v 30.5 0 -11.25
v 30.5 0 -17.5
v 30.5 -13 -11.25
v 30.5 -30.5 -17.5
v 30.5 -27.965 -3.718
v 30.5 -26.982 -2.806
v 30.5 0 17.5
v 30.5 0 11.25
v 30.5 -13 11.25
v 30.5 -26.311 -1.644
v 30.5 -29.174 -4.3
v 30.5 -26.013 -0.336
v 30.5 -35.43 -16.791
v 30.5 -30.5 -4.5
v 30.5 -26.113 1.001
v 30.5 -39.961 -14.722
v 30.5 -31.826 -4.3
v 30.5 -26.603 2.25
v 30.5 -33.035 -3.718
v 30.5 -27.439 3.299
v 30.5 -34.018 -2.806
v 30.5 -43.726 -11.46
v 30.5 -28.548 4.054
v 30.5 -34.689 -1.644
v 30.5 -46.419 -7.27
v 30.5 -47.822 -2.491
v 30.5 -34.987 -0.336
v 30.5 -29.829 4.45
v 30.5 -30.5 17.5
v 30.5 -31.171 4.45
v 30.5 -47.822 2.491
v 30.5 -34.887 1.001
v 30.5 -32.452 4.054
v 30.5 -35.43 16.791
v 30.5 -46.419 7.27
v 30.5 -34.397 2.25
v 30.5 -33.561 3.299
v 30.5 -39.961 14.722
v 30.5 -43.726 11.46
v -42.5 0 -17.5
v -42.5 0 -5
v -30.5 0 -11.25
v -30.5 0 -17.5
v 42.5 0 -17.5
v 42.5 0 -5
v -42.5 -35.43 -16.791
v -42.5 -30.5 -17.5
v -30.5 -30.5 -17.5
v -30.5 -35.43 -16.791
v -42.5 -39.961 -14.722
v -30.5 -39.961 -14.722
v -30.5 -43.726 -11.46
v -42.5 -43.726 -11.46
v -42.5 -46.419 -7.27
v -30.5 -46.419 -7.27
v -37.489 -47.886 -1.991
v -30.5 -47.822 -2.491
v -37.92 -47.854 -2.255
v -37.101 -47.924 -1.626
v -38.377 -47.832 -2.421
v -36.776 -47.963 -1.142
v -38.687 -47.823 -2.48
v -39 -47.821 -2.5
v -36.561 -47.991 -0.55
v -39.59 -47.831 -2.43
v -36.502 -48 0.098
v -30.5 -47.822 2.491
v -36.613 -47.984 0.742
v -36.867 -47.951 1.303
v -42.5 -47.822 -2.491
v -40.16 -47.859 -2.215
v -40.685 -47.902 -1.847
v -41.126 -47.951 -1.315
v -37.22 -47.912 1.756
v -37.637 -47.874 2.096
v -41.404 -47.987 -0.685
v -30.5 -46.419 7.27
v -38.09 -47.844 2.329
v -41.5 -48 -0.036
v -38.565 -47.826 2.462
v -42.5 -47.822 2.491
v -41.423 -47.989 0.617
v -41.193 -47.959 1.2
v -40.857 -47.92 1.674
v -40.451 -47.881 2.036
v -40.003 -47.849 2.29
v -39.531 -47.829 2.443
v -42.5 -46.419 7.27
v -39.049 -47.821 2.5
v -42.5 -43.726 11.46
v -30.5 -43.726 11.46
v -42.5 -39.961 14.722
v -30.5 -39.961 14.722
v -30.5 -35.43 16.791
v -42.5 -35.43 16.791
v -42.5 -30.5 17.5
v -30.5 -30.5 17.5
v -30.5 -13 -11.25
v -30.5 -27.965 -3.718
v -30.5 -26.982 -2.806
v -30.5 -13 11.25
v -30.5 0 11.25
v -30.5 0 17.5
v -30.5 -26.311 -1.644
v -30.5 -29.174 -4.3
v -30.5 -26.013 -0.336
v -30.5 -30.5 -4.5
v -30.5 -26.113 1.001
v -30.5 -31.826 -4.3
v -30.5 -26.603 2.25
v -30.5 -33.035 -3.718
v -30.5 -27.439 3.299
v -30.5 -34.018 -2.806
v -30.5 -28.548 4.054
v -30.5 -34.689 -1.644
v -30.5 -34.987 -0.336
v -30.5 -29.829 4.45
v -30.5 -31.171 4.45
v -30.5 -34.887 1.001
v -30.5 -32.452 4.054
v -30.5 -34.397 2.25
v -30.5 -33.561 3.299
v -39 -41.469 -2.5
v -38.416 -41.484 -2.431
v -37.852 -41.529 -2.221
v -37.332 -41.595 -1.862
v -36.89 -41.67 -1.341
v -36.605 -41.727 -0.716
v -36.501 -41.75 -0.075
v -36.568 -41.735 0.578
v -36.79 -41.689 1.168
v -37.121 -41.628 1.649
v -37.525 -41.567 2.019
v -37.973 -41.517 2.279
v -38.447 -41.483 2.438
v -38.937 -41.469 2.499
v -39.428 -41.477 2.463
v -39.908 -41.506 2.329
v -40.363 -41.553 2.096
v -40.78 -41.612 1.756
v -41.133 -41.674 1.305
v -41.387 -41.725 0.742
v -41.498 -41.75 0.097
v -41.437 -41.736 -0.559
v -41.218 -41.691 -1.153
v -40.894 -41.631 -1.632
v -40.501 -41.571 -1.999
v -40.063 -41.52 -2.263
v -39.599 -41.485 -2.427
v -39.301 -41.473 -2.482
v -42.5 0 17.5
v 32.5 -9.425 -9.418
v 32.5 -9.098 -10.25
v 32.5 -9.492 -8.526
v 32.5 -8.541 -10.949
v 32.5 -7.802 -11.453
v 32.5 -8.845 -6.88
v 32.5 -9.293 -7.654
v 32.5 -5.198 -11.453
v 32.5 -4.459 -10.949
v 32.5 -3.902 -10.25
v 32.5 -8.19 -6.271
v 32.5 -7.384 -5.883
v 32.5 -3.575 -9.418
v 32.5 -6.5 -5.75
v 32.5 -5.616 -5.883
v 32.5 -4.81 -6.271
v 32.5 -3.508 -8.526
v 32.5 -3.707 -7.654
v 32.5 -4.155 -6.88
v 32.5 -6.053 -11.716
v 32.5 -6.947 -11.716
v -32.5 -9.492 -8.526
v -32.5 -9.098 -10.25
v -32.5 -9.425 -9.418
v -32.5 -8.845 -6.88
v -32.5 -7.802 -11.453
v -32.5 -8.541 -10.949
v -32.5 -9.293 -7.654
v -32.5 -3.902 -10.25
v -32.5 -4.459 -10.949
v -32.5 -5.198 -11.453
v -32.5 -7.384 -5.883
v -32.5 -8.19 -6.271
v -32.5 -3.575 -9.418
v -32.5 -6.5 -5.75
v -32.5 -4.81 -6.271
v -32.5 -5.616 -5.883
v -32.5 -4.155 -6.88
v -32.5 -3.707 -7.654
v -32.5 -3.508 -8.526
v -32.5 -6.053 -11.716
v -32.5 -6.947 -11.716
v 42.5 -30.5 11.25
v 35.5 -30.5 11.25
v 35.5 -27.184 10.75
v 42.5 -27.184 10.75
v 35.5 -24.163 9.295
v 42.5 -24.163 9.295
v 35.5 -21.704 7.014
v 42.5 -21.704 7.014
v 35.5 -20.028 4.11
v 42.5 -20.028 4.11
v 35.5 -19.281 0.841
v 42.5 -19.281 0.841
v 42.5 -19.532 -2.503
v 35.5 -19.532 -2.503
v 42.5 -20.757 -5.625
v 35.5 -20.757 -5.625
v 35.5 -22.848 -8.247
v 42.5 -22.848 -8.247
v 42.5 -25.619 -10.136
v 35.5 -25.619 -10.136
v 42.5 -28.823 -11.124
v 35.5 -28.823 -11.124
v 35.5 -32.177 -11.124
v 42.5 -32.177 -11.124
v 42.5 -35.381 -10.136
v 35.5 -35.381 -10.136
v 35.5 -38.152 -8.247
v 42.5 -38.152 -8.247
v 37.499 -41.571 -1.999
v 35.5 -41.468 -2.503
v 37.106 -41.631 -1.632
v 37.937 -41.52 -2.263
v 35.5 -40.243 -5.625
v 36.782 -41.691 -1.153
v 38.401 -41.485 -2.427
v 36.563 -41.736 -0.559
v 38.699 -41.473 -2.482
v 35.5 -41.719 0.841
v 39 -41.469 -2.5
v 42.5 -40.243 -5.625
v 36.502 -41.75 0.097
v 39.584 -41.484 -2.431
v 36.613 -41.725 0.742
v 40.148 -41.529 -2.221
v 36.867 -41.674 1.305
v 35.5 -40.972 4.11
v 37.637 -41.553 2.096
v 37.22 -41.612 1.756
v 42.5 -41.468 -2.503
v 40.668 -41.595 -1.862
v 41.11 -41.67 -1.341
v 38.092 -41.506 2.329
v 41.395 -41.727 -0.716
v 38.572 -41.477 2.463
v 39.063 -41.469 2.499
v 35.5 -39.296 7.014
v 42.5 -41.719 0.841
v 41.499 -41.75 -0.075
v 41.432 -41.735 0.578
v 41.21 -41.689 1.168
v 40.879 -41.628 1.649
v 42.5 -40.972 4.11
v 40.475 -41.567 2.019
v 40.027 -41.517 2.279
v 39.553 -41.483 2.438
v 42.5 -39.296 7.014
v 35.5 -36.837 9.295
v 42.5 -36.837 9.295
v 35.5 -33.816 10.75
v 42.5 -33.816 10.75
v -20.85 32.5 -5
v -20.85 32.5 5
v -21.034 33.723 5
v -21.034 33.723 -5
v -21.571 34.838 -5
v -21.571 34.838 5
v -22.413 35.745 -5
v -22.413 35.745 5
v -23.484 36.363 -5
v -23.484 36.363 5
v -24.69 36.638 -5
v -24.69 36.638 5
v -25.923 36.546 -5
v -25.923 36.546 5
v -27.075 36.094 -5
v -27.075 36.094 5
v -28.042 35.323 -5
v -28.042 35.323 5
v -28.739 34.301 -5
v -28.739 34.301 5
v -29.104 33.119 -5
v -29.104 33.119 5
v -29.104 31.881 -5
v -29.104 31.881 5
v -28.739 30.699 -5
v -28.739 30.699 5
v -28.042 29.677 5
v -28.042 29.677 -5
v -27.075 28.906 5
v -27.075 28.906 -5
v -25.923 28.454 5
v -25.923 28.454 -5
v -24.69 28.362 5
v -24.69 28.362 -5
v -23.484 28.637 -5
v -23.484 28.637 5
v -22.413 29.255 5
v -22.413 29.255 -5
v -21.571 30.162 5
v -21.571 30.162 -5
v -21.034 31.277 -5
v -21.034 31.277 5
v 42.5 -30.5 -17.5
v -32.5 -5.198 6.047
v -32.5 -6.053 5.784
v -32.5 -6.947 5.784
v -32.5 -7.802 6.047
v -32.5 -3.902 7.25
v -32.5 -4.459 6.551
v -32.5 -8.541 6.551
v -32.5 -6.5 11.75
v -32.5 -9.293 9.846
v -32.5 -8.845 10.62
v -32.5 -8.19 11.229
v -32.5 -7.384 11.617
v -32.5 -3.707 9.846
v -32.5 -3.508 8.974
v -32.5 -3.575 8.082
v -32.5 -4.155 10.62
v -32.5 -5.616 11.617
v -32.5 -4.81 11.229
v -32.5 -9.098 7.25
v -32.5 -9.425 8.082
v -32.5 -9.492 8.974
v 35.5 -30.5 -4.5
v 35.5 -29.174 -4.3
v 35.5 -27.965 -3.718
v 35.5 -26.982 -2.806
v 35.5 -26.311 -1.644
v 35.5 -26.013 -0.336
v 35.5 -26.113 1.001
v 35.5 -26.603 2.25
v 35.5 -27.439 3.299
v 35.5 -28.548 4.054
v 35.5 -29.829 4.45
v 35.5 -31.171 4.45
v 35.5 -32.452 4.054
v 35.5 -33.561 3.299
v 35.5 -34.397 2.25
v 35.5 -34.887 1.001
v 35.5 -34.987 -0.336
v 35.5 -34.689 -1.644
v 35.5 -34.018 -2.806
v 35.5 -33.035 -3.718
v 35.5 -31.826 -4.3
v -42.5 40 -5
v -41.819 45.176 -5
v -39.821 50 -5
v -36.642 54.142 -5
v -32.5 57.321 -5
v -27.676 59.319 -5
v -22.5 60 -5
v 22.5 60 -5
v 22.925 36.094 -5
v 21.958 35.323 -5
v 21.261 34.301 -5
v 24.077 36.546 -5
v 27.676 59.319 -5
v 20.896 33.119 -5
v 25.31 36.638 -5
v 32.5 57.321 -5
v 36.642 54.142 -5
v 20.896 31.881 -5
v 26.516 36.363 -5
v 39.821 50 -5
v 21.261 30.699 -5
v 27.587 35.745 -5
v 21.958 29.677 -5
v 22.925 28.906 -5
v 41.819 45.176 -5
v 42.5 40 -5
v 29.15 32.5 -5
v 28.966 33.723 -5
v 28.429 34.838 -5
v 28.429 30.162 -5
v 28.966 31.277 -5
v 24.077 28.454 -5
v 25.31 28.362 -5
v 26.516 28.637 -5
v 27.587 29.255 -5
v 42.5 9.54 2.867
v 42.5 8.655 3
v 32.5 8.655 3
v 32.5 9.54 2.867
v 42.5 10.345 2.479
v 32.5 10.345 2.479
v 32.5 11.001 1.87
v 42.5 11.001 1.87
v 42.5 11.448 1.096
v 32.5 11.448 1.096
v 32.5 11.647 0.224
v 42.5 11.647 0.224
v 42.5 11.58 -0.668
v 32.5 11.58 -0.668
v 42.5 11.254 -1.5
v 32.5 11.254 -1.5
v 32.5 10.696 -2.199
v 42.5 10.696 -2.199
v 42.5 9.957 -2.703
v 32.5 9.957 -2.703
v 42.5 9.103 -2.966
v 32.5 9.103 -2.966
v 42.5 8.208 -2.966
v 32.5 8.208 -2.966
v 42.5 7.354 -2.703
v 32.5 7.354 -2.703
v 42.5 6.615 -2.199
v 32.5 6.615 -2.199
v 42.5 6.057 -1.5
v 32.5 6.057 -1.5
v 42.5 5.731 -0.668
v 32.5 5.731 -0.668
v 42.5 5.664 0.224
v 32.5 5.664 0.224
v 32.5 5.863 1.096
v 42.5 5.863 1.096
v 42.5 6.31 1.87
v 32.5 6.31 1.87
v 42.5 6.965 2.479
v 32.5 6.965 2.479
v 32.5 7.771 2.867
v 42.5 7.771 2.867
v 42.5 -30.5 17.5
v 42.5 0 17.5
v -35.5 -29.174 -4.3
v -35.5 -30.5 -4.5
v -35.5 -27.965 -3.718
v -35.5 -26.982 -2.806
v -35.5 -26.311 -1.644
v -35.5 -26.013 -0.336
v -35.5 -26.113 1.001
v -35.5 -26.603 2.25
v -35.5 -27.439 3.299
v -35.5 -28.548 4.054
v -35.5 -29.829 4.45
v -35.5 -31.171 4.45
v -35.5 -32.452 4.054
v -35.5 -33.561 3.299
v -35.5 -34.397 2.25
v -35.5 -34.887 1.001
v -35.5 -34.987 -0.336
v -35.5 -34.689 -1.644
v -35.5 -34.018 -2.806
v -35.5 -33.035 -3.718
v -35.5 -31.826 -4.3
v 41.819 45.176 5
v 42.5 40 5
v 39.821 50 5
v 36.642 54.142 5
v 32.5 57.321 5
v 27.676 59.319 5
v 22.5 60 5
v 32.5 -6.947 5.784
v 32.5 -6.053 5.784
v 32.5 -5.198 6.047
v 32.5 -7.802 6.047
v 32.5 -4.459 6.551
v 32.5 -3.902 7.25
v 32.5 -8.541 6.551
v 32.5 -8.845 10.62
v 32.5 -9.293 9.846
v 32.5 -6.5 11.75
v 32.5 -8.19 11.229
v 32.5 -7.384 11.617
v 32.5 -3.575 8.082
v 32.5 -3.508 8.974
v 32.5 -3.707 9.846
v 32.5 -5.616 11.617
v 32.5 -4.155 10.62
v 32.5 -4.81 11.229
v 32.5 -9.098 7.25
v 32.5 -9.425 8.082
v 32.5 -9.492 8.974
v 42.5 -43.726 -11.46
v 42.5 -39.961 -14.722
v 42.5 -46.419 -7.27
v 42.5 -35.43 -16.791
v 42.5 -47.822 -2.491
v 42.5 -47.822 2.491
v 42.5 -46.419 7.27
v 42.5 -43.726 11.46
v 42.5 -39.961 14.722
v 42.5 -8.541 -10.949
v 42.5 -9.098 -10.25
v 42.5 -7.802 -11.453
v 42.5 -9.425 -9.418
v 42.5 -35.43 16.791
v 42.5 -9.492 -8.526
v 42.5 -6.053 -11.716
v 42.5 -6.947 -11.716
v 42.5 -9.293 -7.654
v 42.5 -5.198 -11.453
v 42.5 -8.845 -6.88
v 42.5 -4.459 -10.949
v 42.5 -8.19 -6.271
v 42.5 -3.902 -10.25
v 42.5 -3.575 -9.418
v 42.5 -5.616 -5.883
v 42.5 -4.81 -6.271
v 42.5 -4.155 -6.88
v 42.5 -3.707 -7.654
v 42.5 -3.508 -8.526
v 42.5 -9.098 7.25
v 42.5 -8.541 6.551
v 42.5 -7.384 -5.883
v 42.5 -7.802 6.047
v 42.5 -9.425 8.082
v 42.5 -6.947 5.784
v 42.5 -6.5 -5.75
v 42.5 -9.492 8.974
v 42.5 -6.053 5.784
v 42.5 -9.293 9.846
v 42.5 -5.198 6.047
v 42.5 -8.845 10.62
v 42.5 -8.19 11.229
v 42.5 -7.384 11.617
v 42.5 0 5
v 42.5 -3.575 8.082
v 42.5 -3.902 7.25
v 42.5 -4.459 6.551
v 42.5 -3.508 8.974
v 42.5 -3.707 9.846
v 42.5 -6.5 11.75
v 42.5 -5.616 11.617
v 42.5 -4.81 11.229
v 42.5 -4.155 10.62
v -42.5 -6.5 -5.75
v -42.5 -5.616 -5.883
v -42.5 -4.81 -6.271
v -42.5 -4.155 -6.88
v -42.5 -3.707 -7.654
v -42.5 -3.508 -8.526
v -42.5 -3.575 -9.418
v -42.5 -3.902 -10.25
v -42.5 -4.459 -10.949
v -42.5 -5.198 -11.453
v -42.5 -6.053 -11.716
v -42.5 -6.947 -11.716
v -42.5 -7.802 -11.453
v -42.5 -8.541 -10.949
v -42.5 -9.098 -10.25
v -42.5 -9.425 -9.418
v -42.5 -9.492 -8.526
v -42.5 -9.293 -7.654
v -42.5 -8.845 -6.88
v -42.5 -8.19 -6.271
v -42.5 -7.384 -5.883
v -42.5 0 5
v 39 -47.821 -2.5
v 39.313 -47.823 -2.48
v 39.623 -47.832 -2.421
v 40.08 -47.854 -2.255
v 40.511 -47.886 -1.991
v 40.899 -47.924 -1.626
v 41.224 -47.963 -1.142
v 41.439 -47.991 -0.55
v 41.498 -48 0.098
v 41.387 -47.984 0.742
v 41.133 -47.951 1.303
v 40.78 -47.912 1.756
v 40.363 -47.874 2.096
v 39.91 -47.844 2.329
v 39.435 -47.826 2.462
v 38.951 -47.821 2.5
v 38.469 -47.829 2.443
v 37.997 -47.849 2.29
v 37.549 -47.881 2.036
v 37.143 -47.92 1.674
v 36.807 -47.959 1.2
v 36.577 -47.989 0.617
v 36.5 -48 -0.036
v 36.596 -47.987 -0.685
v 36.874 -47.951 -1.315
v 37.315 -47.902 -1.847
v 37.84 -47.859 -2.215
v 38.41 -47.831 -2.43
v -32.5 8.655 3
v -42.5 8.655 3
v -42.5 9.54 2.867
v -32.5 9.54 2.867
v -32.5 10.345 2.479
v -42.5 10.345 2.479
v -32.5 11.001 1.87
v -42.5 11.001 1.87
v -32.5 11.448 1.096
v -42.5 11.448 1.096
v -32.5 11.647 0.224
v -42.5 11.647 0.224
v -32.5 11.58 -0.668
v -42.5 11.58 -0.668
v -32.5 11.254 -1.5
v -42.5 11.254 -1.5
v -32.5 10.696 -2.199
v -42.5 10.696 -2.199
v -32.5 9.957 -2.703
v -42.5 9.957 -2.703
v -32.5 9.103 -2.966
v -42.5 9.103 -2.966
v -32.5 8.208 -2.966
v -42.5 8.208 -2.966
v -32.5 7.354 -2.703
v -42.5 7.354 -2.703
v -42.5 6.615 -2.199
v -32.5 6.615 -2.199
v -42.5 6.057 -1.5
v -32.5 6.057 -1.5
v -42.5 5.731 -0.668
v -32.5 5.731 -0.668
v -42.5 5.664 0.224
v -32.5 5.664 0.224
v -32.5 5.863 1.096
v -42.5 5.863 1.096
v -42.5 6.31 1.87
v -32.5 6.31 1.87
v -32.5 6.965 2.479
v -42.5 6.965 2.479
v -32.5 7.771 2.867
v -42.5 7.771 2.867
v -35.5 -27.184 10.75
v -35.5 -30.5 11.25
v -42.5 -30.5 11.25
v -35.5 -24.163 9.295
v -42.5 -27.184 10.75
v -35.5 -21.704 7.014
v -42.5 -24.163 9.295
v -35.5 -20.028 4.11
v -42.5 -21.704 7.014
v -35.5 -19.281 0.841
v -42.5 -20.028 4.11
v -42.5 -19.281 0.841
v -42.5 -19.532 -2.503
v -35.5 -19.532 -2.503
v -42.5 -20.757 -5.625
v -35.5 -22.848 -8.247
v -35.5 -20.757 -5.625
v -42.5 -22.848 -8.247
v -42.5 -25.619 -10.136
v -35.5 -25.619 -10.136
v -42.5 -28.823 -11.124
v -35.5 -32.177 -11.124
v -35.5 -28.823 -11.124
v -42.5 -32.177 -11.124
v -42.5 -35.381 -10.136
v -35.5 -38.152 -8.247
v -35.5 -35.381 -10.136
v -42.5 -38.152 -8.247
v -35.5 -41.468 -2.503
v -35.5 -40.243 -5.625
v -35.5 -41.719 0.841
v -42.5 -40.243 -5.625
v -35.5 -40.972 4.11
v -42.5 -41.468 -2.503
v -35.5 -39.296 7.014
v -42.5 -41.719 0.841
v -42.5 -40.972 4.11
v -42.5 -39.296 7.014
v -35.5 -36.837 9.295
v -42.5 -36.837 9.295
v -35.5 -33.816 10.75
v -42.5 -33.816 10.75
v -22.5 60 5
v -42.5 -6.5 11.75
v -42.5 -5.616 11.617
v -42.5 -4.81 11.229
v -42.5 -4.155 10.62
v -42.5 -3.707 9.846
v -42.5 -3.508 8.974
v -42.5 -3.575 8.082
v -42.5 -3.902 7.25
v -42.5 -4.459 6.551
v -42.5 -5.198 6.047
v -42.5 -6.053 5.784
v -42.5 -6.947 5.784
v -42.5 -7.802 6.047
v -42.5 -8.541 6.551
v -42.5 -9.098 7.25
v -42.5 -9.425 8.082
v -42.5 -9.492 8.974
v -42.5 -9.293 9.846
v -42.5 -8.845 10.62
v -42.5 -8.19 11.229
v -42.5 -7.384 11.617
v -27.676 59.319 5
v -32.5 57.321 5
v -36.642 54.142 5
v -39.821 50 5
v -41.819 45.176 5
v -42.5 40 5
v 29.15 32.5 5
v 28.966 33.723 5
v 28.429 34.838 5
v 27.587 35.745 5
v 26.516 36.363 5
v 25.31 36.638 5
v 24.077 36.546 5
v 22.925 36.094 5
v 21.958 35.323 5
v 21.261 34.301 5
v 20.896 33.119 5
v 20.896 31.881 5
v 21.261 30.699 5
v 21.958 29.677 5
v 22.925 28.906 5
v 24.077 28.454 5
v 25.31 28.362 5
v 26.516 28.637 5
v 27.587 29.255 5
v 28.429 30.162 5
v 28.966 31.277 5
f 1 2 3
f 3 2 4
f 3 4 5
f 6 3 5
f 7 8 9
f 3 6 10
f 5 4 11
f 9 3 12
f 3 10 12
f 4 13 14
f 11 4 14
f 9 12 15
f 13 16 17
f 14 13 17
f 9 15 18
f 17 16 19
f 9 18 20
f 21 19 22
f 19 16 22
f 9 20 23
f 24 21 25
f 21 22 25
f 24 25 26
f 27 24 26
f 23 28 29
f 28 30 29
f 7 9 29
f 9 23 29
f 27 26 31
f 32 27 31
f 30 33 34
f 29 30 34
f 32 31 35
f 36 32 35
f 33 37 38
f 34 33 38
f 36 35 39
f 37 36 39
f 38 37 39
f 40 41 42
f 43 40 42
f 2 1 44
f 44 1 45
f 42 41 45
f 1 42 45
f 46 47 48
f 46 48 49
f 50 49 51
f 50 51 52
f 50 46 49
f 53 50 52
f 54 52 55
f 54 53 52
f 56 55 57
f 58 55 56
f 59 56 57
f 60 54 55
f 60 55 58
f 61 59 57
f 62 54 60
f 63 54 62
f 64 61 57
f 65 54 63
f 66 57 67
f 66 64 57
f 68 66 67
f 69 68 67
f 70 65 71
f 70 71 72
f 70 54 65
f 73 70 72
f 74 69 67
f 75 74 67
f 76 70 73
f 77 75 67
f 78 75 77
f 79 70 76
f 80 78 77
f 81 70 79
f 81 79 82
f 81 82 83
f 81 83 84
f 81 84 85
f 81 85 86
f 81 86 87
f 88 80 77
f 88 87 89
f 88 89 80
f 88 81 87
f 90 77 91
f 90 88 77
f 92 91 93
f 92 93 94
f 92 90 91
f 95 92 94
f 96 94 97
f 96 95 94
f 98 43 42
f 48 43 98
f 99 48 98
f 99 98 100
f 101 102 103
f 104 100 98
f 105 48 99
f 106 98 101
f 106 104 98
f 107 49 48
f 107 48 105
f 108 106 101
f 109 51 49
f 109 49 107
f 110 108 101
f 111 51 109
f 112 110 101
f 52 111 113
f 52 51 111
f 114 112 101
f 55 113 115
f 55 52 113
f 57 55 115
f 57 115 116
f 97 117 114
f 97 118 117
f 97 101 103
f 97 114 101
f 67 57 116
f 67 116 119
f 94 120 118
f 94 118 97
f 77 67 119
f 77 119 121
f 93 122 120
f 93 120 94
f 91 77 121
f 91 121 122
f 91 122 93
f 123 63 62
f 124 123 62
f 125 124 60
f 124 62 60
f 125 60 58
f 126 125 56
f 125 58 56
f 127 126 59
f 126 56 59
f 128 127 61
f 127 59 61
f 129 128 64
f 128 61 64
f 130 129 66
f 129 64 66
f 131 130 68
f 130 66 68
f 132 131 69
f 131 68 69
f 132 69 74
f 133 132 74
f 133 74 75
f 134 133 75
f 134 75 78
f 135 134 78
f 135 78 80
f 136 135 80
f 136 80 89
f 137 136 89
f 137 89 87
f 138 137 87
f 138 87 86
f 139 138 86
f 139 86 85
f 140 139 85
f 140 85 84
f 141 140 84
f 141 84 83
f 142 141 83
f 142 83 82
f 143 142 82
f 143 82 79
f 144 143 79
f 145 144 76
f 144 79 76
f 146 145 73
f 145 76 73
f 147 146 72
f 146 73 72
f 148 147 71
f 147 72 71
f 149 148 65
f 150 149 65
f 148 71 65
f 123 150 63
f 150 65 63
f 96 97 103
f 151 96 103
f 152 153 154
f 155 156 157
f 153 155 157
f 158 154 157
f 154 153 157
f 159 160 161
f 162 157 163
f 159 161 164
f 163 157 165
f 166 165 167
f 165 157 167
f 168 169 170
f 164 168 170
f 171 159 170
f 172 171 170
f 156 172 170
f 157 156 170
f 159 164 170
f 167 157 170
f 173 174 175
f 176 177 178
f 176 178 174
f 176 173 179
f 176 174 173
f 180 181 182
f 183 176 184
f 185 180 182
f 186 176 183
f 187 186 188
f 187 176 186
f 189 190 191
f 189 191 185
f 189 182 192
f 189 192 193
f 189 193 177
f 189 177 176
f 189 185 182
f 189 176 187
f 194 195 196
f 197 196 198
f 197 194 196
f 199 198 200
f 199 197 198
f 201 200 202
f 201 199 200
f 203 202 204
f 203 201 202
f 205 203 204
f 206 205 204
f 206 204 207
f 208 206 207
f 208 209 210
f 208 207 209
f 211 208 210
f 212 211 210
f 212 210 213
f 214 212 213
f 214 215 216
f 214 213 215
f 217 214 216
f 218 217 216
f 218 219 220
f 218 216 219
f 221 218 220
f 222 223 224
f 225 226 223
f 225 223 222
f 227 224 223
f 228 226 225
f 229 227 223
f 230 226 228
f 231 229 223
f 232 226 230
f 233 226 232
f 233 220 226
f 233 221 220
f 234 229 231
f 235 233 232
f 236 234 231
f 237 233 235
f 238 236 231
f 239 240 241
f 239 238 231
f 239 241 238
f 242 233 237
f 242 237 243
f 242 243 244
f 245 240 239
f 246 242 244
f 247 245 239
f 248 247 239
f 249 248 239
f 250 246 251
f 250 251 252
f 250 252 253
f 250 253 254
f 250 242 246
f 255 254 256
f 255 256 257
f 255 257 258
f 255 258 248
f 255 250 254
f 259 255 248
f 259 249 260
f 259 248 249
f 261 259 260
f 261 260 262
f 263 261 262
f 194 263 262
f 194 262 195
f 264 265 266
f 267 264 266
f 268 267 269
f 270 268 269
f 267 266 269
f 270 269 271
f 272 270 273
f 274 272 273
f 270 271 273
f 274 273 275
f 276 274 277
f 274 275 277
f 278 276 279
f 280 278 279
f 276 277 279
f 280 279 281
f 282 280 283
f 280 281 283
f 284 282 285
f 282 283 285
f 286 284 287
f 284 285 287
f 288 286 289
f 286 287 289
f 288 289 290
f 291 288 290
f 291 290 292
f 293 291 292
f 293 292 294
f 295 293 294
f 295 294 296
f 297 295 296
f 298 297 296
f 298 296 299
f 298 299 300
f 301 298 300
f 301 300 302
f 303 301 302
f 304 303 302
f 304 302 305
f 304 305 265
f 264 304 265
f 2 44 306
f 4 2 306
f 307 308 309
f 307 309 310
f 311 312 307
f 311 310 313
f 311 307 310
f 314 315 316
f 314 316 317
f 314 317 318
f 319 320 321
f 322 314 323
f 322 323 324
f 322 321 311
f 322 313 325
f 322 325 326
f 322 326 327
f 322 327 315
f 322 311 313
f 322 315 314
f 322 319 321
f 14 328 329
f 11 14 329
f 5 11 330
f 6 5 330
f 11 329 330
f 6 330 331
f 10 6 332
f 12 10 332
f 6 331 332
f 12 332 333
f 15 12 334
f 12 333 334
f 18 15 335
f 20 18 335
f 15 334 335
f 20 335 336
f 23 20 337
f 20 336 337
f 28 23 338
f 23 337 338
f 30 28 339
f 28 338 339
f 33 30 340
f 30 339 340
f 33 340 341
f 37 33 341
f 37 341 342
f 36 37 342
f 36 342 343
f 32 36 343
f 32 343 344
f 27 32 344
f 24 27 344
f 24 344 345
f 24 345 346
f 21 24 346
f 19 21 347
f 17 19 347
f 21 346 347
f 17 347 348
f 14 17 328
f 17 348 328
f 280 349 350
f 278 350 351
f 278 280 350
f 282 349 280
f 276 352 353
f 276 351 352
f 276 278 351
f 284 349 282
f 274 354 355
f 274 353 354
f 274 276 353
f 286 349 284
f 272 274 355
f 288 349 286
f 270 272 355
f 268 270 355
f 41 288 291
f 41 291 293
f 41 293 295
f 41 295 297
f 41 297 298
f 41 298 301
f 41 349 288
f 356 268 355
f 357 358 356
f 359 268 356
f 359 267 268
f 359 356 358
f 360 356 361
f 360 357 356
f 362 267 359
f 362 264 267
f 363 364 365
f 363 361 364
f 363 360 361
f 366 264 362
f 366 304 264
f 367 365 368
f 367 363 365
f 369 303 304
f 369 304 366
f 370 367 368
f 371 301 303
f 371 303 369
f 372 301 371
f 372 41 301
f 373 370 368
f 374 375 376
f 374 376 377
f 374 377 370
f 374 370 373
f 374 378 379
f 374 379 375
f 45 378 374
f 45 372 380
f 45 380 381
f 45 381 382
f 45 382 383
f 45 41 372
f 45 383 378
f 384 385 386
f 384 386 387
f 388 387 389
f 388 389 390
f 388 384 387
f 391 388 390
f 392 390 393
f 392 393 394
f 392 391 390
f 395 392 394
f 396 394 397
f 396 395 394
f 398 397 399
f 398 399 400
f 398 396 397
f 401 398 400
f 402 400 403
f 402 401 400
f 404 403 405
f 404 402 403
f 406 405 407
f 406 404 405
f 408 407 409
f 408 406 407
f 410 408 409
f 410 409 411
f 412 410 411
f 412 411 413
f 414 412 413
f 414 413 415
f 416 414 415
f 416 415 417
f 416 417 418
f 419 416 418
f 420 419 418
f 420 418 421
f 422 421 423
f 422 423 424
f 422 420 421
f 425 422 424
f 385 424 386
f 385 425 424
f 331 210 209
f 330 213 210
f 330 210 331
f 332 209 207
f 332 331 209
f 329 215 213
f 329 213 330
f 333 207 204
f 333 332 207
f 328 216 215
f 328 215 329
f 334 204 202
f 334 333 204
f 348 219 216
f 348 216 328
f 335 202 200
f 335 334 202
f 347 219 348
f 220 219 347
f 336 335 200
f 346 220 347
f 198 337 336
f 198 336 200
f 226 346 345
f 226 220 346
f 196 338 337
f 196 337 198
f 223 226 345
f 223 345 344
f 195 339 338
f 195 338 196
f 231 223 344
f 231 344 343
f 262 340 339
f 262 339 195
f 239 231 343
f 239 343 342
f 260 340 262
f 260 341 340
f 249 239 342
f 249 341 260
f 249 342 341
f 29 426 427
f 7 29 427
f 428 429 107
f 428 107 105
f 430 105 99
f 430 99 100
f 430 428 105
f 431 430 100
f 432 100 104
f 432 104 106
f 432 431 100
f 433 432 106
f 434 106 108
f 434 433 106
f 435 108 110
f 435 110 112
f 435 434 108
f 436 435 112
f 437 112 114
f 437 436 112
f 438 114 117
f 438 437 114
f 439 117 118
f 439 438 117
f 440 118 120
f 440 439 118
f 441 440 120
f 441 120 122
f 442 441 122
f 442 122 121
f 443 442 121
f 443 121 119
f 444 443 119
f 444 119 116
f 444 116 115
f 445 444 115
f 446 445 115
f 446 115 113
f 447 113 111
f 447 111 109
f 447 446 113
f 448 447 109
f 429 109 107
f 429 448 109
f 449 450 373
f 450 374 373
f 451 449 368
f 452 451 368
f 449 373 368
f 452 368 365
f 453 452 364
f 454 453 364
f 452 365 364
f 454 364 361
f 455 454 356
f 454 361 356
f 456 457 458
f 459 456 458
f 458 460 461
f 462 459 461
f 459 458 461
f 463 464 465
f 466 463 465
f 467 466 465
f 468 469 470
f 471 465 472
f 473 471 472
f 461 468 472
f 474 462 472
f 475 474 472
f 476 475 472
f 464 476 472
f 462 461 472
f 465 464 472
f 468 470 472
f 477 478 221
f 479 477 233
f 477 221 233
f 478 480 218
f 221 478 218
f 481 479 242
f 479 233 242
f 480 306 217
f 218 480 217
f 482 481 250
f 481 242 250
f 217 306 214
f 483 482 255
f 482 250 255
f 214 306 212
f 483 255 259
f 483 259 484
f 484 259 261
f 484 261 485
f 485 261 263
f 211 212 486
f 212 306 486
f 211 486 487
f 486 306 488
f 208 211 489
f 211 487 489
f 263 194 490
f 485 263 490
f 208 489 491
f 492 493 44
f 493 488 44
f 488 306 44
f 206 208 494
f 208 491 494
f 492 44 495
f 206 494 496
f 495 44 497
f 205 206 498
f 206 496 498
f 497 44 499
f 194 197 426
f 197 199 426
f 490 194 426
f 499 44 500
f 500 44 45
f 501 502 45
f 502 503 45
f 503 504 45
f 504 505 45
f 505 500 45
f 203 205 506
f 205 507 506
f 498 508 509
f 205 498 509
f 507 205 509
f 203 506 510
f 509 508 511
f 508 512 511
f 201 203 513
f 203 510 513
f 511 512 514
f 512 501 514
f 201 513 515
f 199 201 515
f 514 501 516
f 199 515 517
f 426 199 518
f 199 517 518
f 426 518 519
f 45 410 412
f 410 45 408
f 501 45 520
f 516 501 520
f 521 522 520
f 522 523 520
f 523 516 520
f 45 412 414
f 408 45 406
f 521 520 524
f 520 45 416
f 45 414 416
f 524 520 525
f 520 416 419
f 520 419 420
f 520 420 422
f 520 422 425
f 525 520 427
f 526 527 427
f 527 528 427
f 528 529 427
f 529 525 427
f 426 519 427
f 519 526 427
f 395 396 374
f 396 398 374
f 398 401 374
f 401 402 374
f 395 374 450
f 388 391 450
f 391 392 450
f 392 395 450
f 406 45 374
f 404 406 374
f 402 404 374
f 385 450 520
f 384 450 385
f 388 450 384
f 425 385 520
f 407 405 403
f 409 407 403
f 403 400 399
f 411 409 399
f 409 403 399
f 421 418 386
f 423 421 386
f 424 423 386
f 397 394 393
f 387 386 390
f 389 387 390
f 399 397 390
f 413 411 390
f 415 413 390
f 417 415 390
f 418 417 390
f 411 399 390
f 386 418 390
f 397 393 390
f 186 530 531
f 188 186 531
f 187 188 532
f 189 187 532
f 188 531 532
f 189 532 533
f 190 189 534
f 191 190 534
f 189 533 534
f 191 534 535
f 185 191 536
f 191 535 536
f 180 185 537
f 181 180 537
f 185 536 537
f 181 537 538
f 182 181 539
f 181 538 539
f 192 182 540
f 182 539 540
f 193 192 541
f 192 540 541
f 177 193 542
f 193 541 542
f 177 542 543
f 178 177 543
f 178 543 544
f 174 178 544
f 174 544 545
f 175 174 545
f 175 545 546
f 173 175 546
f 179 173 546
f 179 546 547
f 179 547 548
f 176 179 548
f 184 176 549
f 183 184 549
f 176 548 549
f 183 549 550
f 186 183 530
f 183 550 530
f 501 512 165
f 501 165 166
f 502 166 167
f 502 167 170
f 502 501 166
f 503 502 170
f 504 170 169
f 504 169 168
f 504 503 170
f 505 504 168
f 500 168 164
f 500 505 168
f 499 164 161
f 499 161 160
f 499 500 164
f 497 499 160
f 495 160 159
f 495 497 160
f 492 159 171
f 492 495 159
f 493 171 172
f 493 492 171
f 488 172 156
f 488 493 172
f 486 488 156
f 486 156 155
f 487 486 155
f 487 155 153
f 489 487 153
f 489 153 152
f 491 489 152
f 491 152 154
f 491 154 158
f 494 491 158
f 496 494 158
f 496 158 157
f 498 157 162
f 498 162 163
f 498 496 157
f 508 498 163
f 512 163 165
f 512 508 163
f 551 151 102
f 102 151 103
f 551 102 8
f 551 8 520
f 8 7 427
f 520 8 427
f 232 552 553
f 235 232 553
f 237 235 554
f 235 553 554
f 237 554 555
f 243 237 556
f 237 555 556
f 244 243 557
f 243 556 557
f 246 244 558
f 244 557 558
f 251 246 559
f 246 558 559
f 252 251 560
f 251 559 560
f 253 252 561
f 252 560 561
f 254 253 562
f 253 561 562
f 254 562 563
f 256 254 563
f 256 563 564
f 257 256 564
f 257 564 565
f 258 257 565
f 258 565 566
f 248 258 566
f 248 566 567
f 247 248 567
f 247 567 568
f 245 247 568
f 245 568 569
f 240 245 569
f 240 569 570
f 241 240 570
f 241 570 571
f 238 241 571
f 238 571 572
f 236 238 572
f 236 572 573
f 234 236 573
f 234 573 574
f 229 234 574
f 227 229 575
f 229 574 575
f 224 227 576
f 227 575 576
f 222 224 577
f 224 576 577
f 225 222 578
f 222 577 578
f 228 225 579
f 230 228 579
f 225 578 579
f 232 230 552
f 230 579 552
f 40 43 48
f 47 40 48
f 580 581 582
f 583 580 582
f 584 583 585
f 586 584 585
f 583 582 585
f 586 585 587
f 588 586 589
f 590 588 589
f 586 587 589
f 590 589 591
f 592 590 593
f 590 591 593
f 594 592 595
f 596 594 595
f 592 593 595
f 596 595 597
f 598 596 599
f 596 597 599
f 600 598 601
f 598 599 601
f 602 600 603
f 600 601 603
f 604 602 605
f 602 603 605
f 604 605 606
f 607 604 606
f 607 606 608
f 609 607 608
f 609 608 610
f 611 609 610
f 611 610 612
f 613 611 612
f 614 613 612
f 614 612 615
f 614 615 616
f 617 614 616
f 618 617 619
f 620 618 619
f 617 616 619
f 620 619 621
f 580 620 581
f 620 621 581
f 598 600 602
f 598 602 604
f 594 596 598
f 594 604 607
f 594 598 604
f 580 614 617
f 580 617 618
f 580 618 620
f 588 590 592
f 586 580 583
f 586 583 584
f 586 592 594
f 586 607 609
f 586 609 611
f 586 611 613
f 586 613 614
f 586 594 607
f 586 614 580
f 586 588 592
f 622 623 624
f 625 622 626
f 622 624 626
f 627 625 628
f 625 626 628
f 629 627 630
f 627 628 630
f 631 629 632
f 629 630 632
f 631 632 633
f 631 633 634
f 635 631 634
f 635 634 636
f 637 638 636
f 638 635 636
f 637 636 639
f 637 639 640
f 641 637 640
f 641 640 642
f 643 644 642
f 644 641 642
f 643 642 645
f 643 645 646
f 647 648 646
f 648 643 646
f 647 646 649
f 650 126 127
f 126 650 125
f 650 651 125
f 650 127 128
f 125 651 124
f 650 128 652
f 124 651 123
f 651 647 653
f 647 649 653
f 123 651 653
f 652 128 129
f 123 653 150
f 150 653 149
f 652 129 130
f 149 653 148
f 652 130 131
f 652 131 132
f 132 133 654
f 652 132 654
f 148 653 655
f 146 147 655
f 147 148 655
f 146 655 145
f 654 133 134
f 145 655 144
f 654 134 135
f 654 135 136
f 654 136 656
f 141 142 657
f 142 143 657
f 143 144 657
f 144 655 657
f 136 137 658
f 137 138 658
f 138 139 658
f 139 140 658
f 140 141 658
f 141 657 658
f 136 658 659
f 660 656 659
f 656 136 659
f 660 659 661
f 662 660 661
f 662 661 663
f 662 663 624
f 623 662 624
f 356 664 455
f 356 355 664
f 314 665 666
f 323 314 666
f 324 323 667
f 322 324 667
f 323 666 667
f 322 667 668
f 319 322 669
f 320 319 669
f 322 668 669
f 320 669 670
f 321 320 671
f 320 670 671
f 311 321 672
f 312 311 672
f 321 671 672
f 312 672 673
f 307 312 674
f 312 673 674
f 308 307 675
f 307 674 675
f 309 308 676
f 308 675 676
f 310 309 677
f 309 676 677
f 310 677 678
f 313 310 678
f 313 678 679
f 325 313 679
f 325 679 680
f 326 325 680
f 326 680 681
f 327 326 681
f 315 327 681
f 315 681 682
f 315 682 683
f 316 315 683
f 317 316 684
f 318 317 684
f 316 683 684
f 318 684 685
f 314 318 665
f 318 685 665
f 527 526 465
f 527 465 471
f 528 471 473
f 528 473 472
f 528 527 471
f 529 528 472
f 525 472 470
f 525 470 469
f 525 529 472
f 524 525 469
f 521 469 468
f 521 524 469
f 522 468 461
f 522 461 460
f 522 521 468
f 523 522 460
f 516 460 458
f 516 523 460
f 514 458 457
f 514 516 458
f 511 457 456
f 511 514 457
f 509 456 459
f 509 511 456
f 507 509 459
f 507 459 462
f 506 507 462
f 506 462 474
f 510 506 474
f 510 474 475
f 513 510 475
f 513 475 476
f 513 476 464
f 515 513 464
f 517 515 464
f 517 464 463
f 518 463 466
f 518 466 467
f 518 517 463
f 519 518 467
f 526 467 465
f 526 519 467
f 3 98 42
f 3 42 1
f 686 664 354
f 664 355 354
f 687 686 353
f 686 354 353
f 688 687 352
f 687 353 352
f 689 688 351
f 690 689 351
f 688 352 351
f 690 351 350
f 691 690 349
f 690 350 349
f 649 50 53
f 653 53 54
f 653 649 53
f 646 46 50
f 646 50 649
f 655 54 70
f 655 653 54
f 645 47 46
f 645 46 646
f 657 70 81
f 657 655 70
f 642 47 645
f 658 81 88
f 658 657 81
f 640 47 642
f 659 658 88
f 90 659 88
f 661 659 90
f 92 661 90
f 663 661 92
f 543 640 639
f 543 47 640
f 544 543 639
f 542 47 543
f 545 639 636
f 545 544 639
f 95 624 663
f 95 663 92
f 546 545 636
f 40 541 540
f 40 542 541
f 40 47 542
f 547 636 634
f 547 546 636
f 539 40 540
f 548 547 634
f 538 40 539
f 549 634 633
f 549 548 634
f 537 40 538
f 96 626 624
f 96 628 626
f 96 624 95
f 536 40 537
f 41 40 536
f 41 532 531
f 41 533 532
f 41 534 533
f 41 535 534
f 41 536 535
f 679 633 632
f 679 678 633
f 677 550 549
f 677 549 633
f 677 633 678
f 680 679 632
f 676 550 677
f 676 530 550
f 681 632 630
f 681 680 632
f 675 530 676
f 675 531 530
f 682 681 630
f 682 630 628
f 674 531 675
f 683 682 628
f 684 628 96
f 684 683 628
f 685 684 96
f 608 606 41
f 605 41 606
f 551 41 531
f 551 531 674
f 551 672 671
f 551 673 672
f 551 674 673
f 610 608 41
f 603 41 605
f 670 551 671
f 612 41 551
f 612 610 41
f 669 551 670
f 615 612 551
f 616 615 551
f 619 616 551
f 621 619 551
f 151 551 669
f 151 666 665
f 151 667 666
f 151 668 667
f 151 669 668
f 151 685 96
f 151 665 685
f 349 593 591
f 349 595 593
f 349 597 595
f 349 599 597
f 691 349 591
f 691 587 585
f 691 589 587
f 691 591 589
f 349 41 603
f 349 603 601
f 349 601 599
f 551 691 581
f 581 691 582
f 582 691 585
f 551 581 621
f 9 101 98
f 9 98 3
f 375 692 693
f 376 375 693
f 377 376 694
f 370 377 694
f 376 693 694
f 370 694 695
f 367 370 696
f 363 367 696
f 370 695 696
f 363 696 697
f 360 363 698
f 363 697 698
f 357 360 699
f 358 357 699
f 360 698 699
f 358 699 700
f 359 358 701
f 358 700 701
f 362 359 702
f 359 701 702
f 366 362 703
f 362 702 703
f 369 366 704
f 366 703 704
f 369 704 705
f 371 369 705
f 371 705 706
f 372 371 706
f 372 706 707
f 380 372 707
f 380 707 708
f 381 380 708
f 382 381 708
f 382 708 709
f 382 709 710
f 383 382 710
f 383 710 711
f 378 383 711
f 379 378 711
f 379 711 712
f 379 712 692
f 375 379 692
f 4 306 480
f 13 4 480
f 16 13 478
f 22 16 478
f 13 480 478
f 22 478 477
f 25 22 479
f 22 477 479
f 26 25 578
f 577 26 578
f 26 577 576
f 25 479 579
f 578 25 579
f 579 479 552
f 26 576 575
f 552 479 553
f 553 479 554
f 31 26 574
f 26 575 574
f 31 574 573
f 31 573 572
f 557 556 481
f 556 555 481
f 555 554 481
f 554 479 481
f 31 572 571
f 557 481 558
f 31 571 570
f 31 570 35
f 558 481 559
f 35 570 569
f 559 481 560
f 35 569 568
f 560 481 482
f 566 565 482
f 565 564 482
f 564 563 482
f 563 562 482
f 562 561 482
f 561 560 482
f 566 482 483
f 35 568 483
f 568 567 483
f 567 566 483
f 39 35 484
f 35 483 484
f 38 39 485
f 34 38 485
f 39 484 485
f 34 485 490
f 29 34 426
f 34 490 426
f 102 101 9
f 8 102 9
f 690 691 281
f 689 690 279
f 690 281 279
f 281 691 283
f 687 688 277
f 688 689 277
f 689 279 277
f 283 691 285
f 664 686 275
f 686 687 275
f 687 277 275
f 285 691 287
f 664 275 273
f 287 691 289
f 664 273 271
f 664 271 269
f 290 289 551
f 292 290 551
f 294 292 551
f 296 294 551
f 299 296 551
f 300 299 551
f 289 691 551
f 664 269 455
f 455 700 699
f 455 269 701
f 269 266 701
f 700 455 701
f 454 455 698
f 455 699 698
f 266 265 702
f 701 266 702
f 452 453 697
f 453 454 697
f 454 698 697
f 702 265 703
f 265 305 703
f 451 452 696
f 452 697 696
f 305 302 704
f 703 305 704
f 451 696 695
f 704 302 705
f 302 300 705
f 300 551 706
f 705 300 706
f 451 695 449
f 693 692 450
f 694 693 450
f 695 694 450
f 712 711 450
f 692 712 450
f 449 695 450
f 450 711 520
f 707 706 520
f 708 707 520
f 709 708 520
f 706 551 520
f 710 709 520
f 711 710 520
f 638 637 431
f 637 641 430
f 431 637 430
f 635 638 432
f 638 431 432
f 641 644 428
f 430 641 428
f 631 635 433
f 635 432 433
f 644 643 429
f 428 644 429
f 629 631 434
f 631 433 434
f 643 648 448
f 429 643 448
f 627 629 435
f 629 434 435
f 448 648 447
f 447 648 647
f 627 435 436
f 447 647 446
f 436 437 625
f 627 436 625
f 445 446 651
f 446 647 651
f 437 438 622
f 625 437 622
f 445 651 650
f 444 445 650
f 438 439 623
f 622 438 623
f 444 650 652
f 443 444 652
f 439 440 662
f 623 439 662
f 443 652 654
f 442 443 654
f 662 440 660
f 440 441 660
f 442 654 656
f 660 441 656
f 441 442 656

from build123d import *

# Parameters (mm, degrees)
SKETCH1_W           = 85
SKETCH1_H           = 10
BOSS_EXTRUDE1_DEPTH = 60
SKETCH2_R           = 4.15
CUT_EXTRUDE1_DEPTH  = 75.204110398
SKETCH3_W           = 85
SKETCH3_H           = 35
BOSS_EXTRUDE2_DEPTH = 13
SKETCH4_R           = 11.25
BOSS_EXTRUDE4_DEPTH = 12
BOSS_EXTRUDE5_START = -5
SKETCH5_R           = 11.25
SKETCH5_R_2         = 4.5
BOSS_EXTRUDE5_DEPTH = 5
SKETCH6_R           = 3
CUT_EXTRUDE2_DEPTH  = 10
SKETCH7_R           = 2.5
CUT_EXTRUDE3_DEPTH  = 10
FILLET2_R           = 20
SKETCH8_W           = 61
SKETCH8_H           = 6.25
CUT_EXTRUDE4_DEPTH  = 20


with BuildPart() as part:
    # Sketch1 → Boss-Extrude1 (new body)
    with BuildSketch(Plane(origin=(0, 0, 0), x_dir=(1, 0, 0), z_dir=(0, 1, 0))):
        Rectangle(SKETCH1_W, SKETCH1_H)
    extrude(amount=BOSS_EXTRUDE1_DEPTH)

    # Sketch2 → Cut-Extrude1 (cut, through all)
    with BuildSketch(Plane.XY.offset(5)):
        with Locations((-25, 32.5)):
            Circle(SKETCH2_R)
        with Locations((25, 32.5)):
            Circle(SKETCH2_R)
    extrude(amount=-CUT_EXTRUDE1_DEPTH, mode=Mode.SUBTRACT)

    # Sketch3 → Boss-Extrude2 (add)
    with BuildSketch(Plane.XZ):
        Rectangle(SKETCH3_W, SKETCH3_H)
    extrude(amount=BOSS_EXTRUDE2_DEPTH)

    # Sketch4 → Boss-Extrude4 (add)
    with BuildSketch(Plane.ZY.offset(42.5)):
        with BuildLine():
            Line((-17.5, -13), (-17.5, -30.5))
            ThreePointArc((-17.5, -30.5), (0, -48), (17.5, -30.5))
            Line((17.5, -30.5), (17.5, -13))
            Line((17.5, -13), (-17.5, -13))
        make_face()
        with Locations((0, -30.5)):
            Circle(SKETCH4_R, mode=Mode.SUBTRACT)
    boss_extrude4 = extrude(amount=-BOSS_EXTRUDE4_DEPTH)

    # Sketch5 → Boss-Extrude5 (add)
    with BuildSketch(Plane(origin=(-30.5, 0, 0), x_dir=(0, 0, -1), z_dir=(1, 0, 0)).offset(BOSS_EXTRUDE5_START)):
        with Locations(Location((0, -30.5, 0), (0, 0, 180))):
            Circle(SKETCH5_R)
        with Locations((0, -30.5)):
            Circle(SKETCH5_R_2, mode=Mode.SUBTRACT)
    boss_extrude5 = extrude(amount=BOSS_EXTRUDE5_DEPTH)

    # Sketch6 → Cut-Extrude2 (cut)
    with BuildSketch(Plane.ZY.offset(42.5)):
        with Locations((-8.75, -6.5)):
            Circle(SKETCH6_R)
        with Locations((8.75, -6.5)):
            Circle(SKETCH6_R)
        with Locations((0, 8.655444566)):
            Circle(SKETCH6_R)
    cut_extrude2 = extrude(amount=-CUT_EXTRUDE2_DEPTH, mode=Mode.SUBTRACT)

    # Mirror2: Boss-Extrude4, Boss-Extrude5, Cut-Extrude2 across plane
    add(boss_extrude4.mirror(Plane(origin=(0, 0, 0), x_dir=(0, 0, 1), z_dir=(1, 0, 0))))
    add(boss_extrude5.mirror(Plane(origin=(0, 0, 0), x_dir=(0, 0, 1), z_dir=(1, 0, 0))))
    add(cut_extrude2.mirror(Plane(origin=(0, 0, 0), x_dir=(0, 0, 1), z_dir=(1, 0, 0))), mode=Mode.SUBTRACT)

    # Sketch7 → Cut-Extrude3 (cut)
    with BuildSketch(Plane(origin=(0, -48, 0), x_dir=(-1, 0, 0), z_dir=(0, -1, 0))):
        with Locations(Location((-39, 0, 0), (0, 0, 90))):
            Circle(SKETCH7_R)
        with Locations(Location((39, 0, 0), (0, 0, 90))):
            Circle(SKETCH7_R)
    extrude(amount=-CUT_EXTRUDE3_DEPTH, mode=Mode.SUBTRACT)

    # Fillet2
    fillet2_edges = [part.edges().sort_by_distance(p)[0] for p in [
        (42.5, 60, 0),
        (-42.5, 60, 0),
    ]]
    fillet(fillet2_edges, radius=FILLET2_R)

    # Sketch8 → Cut-Extrude4 (cut)
    with BuildSketch(Plane.XZ.offset(13)):
        with Locations((0, 14.375)):
            Rectangle(SKETCH8_W, SKETCH8_H)
        with Locations((0, -14.375)):
            Rectangle(SKETCH8_W, SKETCH8_H)
    extrude(amount=-CUT_EXTRUDE4_DEPTH, mode=Mode.SUBTRACT)


solid = part.part
